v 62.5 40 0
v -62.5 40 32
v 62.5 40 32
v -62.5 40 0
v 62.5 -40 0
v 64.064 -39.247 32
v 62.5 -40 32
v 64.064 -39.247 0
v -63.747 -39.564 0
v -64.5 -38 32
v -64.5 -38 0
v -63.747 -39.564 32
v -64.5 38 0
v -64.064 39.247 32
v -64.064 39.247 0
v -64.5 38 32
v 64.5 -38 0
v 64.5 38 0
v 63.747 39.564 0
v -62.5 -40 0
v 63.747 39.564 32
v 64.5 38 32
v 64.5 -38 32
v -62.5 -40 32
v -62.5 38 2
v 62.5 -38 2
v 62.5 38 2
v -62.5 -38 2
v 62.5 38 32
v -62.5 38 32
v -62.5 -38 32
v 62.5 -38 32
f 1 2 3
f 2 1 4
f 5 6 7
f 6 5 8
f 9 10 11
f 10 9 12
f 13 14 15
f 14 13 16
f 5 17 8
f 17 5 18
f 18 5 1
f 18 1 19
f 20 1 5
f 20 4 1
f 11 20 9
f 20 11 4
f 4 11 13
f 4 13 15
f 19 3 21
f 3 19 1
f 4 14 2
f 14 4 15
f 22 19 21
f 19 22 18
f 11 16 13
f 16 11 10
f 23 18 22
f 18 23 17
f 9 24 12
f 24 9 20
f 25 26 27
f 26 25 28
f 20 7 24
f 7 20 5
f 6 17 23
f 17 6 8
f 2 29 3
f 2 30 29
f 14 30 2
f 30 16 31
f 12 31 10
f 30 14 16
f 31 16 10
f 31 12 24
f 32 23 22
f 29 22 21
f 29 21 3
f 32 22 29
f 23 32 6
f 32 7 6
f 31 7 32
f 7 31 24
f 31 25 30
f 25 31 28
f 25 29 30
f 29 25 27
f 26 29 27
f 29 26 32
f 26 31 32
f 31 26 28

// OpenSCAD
// file: card_box.scad
module card_box(x, y, z, wall) {
    base = [x, y];

    card_shell(z, wall) square(base, true);
}

module card_shell(height, wall) {
    union() {
        linear_extrude(wall) offset(r=wall) children();
        linear_extrude(height + wall) difference() {
            offset(r=wall) children();
            children();
        }    
    }
}
// main file
// location_box.scad
// ----------------------------------------------------------------------------
// A single open-topped card well: the minimal thin-wall test print from the
// iteration loop. Outer block, carved out to leave 2mm walls + a 2mm floor.
//
// This is the smallest useful OpenSCAD shape: a box minus a smaller box.
// Everything else in the insert is a variation on it.
// ----------------------------------------------------------------------------


// ---- Module: location_box --------------------------------------------------
// A `module` is the closest thing OpenSCAD has to a class/function. The named
// arguments with defaults act like constructor defaults — call it bare to get
// the defaults, or override any of them: location_box(depth = 45);
//
// Units are millimeters throughout (OpenSCAD is unitless; the slicer reads mm)

// module location_box(
//         x       = 125,   // card footprint, long edge (location stack + tolerance)
//         y       = 75,    // card footprint, short edge
//         depth   = 30,    // cavity depth — PLACEHOLDER, real depth pending stack measurement
//         wall    = 2,     // side-wall thickness
//         floor_t = 2)     // floor thickness
// {
//     // A vector [x, y, z]. The outer block adds a wall on each of the 4 sides
//     // and one floor underneath. This is a local variable — scoped to the module.
//     outer = [
//         x + 2 * wall, 
//         y + 2 * wall, 
//         depth + floor_t
//     ];

//     // difference() = take the FIRST child, then subtract every child after it.
//     // Solid block  minus  inner cavity  = an open-topped tray.
//     difference() {

//         // (1) the solid outer block, corner sitting at the origin
//         cube(outer);

//         // (2) the cavity to remove. translate() shifts it up by the floor
//         //     thickness and inward by one wall on x and y, so what's left is
//         //     floor + four walls. The +0.2 overshoot on z pokes the cavity
//         //     through the top face so the well is cleanly open — without it
//         //     you'd get a paper-thin skin across the top (a "z-fighting" artifact).
//         translate([wall, wall, floor_t])
//             cube([x, y, depth + 0.2]);
//     }
// }


// // ---- Render ----------------------------------------------------------------
// // This bare call is what draws when you open THIS file. Later, assembly.scad
// // will `use <location_box.scad>;` — `use` imports the module but ignores this
// // bottom-level call, so importing won't dump a stray box into the assembly.
// // (`include <>` would run it; `use <>` won't. That distinction matters.)

// location_box();
use <card_box.scad>;

card_box(x = 125, y = 76, z = 30, wall = 2);
